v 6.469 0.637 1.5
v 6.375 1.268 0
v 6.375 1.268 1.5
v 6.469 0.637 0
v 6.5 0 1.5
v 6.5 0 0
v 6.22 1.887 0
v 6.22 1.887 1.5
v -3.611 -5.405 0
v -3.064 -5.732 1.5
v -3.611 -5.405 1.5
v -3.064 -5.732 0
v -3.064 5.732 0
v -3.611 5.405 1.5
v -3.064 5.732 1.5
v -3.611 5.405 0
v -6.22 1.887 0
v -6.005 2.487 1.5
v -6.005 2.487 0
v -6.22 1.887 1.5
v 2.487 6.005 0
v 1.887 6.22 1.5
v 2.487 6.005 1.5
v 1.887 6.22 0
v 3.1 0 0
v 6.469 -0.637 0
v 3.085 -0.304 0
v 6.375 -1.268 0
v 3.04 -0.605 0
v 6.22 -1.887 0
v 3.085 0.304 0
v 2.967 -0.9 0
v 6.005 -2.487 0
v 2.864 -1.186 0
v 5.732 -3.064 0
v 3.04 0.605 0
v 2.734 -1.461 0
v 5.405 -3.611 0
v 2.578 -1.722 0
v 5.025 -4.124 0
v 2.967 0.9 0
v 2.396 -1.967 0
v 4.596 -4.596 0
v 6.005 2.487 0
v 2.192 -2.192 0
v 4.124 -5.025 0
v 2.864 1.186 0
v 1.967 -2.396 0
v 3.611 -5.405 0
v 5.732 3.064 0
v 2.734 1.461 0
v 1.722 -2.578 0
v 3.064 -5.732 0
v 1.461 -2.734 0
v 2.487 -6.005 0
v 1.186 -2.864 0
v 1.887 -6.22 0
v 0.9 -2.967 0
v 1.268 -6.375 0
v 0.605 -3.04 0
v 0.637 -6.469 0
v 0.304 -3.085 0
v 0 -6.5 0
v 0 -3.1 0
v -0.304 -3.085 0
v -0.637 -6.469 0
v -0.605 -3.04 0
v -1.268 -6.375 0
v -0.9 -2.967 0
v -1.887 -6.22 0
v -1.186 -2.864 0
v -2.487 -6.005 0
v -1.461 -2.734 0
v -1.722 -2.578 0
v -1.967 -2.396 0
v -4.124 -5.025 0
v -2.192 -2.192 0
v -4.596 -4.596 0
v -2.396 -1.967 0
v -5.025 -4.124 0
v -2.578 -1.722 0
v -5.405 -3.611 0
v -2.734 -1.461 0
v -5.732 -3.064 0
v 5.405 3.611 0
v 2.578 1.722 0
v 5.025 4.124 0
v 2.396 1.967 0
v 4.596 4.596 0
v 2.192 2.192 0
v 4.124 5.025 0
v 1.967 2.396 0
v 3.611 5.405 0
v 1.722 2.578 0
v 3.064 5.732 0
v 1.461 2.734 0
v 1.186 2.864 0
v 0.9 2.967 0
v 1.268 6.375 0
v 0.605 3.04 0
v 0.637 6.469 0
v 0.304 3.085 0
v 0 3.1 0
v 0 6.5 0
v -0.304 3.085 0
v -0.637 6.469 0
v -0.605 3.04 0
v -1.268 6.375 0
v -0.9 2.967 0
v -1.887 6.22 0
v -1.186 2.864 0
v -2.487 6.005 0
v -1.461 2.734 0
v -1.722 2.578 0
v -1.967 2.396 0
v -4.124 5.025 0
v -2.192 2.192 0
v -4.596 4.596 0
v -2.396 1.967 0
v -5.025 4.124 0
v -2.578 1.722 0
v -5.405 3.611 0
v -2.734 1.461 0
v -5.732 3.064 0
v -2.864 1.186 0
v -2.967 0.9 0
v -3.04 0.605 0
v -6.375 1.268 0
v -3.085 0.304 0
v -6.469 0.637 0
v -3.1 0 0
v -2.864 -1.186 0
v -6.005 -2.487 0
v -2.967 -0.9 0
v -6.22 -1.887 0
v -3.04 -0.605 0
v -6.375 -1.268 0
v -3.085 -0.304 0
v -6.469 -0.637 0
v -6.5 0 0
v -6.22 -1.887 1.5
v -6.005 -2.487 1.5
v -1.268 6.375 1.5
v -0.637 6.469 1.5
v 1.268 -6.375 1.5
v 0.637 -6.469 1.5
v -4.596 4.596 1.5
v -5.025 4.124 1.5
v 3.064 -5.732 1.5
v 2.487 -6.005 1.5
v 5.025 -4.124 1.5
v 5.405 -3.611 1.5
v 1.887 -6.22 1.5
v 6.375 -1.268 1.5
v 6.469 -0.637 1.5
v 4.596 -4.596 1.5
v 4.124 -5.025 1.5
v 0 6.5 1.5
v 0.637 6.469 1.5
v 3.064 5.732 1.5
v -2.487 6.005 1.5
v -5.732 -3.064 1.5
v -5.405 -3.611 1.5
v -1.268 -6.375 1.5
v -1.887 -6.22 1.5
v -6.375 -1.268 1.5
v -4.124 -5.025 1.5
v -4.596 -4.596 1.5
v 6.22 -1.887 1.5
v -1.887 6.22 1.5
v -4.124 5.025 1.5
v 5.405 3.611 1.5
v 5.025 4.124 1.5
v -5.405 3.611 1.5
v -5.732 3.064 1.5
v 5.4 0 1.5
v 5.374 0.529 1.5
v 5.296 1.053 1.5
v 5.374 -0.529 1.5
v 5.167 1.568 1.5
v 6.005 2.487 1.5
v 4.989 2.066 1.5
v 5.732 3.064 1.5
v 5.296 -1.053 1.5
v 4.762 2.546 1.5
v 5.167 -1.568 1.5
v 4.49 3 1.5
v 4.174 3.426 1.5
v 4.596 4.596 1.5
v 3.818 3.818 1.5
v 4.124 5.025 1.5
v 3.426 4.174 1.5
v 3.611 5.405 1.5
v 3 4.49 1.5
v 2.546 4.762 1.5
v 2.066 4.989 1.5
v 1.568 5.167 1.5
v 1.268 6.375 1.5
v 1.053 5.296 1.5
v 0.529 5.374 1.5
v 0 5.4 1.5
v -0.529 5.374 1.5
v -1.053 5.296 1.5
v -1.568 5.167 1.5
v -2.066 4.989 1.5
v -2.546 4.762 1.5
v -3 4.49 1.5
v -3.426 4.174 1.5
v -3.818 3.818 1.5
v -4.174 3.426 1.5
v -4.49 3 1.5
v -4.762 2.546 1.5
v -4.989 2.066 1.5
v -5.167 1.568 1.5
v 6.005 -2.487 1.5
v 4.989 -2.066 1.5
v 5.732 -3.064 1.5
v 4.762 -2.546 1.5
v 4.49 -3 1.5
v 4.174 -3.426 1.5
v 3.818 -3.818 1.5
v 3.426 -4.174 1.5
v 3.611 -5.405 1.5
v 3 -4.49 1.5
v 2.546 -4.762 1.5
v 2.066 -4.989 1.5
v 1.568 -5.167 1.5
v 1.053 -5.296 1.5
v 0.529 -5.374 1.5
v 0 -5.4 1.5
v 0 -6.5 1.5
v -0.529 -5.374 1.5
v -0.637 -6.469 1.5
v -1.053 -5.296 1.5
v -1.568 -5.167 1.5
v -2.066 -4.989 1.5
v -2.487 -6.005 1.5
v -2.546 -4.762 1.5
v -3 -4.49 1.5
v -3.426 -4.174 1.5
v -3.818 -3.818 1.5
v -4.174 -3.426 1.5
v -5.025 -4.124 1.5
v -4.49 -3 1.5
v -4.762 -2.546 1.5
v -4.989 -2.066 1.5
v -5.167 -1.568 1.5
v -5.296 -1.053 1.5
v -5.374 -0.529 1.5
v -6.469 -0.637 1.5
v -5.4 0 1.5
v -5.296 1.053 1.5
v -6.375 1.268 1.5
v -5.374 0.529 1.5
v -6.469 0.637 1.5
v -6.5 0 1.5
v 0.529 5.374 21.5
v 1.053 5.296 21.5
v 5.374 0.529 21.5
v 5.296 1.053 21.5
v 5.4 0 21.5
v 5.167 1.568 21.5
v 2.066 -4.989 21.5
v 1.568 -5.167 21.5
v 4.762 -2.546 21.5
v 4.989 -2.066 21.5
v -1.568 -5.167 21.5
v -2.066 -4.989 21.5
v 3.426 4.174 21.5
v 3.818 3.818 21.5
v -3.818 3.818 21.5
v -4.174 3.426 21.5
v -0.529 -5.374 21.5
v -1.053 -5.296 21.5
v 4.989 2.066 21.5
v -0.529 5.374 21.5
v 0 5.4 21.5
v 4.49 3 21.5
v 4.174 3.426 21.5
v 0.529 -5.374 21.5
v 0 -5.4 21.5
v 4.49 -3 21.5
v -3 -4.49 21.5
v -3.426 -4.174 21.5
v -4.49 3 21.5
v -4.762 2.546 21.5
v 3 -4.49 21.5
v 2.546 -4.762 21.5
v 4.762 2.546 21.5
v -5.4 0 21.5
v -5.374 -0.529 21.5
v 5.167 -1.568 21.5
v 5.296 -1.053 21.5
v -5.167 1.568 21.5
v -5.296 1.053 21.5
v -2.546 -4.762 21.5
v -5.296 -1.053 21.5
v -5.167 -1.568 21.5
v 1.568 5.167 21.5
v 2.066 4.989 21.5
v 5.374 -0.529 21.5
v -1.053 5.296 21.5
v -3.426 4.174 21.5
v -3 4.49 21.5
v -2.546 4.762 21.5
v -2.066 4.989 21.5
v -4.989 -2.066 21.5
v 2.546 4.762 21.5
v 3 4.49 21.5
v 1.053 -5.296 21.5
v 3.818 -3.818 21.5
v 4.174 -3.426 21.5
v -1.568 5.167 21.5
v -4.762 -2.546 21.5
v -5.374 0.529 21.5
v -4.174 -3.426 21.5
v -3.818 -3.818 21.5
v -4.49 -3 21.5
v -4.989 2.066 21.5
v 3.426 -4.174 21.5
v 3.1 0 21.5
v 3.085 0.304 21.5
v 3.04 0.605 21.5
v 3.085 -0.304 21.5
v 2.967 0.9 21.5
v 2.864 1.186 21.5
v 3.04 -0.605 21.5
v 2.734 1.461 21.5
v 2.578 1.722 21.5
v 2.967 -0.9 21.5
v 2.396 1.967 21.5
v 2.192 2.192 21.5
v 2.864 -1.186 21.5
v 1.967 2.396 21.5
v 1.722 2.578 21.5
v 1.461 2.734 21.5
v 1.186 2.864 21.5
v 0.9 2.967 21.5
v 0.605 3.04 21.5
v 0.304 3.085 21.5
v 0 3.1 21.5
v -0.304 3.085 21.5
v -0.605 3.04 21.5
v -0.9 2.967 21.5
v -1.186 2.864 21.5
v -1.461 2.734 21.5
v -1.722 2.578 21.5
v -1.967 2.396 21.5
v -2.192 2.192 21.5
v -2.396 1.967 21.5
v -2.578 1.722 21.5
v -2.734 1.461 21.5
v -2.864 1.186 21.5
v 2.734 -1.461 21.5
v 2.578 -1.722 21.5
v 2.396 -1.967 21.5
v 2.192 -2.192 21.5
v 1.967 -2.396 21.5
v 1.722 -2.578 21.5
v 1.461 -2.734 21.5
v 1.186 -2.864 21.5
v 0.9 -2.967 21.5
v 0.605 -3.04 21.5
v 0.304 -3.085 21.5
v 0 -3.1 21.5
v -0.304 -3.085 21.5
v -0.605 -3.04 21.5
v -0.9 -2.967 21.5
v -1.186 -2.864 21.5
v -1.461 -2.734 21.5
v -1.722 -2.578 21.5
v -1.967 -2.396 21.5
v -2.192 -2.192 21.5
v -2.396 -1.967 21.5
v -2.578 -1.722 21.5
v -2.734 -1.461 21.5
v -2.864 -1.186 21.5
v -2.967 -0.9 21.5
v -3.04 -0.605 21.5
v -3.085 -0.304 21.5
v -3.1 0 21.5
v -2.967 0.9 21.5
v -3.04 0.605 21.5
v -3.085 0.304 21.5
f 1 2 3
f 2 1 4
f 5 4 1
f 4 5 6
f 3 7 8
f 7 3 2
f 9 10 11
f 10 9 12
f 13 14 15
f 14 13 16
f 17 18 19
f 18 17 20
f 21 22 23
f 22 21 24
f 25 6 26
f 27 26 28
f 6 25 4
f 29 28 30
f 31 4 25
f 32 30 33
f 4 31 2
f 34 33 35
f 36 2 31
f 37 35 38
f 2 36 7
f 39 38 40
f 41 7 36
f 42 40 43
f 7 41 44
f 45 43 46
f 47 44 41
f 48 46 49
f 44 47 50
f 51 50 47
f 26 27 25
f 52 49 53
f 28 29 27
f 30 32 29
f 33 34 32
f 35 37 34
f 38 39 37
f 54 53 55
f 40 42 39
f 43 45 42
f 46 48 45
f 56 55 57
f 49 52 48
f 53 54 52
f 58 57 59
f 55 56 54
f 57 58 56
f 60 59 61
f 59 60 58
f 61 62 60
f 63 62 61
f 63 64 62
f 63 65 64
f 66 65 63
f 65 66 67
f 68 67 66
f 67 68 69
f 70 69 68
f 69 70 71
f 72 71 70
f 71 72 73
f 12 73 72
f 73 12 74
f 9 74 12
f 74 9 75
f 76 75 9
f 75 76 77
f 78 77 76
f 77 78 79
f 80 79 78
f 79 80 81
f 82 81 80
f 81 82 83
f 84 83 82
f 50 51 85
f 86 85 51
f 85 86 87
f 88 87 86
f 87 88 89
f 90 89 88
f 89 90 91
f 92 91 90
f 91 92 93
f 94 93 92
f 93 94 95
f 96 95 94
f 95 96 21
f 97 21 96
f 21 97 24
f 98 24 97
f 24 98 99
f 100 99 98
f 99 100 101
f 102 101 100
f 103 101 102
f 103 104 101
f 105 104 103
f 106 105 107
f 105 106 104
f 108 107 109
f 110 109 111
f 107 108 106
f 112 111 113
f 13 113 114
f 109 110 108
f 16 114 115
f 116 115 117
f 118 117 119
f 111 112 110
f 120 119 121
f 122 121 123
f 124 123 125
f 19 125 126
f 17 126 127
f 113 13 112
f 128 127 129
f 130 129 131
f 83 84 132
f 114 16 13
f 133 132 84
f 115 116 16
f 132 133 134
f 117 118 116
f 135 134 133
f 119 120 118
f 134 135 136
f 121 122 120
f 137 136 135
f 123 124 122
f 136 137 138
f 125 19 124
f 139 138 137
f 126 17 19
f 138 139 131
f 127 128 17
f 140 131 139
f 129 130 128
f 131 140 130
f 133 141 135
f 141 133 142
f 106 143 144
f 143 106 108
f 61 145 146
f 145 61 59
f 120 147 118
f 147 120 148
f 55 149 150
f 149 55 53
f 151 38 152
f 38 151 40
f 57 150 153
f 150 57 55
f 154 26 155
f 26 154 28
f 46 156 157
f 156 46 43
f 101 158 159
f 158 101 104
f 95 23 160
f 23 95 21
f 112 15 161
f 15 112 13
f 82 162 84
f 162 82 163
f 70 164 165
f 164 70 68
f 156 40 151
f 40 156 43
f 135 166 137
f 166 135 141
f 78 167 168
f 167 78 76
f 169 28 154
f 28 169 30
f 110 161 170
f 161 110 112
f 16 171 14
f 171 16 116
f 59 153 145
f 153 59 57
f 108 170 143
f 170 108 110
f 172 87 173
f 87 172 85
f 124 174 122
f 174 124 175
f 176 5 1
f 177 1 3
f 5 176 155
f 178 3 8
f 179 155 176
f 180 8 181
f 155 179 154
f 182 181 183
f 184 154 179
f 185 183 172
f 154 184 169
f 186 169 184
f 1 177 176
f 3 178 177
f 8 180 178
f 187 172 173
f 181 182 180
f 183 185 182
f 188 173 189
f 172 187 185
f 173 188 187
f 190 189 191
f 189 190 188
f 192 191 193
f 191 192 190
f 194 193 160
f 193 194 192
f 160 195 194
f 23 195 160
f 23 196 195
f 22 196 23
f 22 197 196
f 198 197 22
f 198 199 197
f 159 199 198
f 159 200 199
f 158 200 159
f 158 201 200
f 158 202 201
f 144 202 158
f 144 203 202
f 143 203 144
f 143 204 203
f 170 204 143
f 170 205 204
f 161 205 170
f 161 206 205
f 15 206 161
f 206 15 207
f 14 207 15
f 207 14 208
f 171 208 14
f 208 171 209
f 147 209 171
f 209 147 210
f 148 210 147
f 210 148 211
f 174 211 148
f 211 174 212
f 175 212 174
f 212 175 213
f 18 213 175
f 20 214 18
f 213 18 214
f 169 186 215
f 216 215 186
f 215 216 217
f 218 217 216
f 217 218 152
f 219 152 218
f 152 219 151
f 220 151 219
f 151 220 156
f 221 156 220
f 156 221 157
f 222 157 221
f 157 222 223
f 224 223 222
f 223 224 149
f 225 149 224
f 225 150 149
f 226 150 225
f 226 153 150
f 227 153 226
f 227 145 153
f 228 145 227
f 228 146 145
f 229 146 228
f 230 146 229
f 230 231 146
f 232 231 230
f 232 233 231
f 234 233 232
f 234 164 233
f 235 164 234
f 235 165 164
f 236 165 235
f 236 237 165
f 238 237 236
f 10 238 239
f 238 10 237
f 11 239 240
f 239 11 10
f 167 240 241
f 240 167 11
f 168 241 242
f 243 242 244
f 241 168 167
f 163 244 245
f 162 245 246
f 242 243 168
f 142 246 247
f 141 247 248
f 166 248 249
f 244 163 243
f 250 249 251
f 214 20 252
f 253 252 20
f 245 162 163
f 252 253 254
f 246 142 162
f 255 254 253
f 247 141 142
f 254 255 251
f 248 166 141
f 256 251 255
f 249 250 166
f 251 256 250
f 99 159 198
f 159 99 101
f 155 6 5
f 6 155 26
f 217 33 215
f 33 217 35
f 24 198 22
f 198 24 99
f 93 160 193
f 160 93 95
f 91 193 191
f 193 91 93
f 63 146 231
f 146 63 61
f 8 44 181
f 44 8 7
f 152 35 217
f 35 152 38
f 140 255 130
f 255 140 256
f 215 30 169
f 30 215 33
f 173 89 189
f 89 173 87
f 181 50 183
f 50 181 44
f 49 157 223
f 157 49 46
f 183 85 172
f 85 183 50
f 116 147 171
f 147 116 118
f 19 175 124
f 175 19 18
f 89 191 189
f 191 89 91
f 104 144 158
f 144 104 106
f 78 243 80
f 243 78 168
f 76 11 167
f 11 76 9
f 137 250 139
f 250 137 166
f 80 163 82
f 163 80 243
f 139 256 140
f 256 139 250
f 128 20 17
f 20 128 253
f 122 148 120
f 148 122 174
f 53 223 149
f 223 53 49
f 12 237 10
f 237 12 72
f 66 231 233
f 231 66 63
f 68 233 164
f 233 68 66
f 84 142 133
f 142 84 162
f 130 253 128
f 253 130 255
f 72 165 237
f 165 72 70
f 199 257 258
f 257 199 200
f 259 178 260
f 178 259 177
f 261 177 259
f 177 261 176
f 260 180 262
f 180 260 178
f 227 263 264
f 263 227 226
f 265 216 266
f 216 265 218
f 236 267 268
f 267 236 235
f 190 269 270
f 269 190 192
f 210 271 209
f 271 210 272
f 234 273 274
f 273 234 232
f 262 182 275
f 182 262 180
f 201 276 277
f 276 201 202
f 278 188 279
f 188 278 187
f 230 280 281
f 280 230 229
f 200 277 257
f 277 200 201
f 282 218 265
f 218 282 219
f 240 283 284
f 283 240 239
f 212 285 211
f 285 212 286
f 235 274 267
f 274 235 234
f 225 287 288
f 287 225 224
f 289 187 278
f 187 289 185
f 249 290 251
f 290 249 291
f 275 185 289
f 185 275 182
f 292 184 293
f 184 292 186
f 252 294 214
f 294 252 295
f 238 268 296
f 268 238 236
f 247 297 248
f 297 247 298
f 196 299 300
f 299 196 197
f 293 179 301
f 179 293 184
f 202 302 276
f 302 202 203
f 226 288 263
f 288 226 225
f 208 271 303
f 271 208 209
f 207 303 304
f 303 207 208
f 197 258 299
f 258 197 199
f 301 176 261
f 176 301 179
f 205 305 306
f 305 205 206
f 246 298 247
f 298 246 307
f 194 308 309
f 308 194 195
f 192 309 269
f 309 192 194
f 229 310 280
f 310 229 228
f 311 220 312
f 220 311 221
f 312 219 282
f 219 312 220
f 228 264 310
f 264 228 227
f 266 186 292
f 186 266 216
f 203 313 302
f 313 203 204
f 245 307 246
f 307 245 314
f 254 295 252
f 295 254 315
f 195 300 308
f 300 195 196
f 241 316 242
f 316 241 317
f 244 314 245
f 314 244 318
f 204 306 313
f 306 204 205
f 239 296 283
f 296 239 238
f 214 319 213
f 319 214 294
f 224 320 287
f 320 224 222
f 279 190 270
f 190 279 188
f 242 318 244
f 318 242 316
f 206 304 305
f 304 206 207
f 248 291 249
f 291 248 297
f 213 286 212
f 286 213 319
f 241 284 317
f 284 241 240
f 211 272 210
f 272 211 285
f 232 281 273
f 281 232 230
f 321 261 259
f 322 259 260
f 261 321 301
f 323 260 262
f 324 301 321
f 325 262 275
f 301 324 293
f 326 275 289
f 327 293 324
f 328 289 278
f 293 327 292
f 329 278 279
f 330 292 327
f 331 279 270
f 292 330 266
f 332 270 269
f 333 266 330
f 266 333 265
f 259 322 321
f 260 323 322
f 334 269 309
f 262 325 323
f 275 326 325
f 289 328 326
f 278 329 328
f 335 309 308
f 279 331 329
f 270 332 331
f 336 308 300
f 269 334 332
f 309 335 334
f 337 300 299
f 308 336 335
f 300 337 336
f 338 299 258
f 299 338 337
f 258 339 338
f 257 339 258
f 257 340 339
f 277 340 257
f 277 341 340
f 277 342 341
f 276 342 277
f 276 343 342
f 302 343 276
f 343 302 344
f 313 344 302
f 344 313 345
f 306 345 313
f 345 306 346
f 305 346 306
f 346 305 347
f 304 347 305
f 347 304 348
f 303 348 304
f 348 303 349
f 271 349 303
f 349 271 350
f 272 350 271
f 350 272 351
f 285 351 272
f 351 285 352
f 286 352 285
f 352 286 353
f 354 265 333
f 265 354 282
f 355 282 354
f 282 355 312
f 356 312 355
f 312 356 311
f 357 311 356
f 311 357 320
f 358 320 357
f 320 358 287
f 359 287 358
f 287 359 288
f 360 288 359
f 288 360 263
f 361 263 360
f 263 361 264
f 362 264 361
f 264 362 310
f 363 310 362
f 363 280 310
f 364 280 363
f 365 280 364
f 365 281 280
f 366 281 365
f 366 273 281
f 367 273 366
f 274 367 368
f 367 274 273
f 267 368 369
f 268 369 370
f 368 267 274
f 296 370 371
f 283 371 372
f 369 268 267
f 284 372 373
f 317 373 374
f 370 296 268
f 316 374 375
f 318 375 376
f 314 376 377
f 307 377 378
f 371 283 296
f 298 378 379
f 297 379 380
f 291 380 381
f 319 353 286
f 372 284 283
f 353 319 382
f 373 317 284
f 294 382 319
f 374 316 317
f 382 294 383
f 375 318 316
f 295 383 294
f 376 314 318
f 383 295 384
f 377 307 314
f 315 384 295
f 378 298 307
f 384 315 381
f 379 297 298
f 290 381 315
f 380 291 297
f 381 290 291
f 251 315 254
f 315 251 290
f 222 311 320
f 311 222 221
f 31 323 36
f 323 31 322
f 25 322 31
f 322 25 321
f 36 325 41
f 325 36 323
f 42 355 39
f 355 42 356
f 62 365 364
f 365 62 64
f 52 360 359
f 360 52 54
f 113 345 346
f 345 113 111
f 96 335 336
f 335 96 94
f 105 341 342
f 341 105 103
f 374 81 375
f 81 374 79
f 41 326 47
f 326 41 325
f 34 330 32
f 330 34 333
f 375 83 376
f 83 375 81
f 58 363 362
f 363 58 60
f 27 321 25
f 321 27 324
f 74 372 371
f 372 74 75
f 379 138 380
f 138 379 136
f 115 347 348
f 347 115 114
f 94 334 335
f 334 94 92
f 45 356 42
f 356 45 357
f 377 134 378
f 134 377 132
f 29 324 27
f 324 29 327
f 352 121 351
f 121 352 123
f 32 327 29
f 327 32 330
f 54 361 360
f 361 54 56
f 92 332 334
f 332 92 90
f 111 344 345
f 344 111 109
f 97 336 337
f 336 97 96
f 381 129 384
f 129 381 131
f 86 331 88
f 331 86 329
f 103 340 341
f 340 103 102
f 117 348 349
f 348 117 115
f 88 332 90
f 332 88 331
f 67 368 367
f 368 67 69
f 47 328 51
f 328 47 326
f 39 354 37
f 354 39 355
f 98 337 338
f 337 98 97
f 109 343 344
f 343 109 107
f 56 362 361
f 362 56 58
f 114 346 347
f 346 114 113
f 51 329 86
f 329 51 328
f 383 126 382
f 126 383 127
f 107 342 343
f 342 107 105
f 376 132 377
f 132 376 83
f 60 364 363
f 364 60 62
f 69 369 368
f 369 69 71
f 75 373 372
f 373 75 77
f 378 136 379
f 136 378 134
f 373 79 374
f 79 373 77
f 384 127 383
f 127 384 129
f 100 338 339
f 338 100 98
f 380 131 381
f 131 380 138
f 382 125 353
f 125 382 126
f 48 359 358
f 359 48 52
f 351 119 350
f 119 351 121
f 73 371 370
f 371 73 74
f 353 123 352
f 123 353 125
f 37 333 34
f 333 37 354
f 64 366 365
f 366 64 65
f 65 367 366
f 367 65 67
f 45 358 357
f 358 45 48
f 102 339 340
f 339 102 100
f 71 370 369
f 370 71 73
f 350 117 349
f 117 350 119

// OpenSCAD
// PCR tube adapter sleeve - print upside down
// Units: mm

$fn = 64;

// --- Dimensions ---
collar_d        = 13;    // collar outer diameter
collar_t        = 1.5;   // collar thickness (z = 0 to 1.5)
sleeve_od       = 10.8;  // sleeve outer diameter
sleeve_h        = 21.5;  // sleeve total height (z = 0 to 21.5)
bore_d          = 6.2;   // through-bore diameter
eps             = 0.5;   // cutter overshoot past faces

// --- Model ---
difference() {
    union() {
        // Collar on the bed
        cylinder(d = collar_d, h = collar_t);

        // Sleeve body rising from the collar
        translate([0, 0, collar_t])
            cylinder(d = sleeve_od, h = sleeve_h - collar_t);
    }

    // Straight bore through the full height, open at both ends
    translate([0, 0, -eps])
        cylinder(d = bore_d, h = sleeve_h + 2 * eps);
}
